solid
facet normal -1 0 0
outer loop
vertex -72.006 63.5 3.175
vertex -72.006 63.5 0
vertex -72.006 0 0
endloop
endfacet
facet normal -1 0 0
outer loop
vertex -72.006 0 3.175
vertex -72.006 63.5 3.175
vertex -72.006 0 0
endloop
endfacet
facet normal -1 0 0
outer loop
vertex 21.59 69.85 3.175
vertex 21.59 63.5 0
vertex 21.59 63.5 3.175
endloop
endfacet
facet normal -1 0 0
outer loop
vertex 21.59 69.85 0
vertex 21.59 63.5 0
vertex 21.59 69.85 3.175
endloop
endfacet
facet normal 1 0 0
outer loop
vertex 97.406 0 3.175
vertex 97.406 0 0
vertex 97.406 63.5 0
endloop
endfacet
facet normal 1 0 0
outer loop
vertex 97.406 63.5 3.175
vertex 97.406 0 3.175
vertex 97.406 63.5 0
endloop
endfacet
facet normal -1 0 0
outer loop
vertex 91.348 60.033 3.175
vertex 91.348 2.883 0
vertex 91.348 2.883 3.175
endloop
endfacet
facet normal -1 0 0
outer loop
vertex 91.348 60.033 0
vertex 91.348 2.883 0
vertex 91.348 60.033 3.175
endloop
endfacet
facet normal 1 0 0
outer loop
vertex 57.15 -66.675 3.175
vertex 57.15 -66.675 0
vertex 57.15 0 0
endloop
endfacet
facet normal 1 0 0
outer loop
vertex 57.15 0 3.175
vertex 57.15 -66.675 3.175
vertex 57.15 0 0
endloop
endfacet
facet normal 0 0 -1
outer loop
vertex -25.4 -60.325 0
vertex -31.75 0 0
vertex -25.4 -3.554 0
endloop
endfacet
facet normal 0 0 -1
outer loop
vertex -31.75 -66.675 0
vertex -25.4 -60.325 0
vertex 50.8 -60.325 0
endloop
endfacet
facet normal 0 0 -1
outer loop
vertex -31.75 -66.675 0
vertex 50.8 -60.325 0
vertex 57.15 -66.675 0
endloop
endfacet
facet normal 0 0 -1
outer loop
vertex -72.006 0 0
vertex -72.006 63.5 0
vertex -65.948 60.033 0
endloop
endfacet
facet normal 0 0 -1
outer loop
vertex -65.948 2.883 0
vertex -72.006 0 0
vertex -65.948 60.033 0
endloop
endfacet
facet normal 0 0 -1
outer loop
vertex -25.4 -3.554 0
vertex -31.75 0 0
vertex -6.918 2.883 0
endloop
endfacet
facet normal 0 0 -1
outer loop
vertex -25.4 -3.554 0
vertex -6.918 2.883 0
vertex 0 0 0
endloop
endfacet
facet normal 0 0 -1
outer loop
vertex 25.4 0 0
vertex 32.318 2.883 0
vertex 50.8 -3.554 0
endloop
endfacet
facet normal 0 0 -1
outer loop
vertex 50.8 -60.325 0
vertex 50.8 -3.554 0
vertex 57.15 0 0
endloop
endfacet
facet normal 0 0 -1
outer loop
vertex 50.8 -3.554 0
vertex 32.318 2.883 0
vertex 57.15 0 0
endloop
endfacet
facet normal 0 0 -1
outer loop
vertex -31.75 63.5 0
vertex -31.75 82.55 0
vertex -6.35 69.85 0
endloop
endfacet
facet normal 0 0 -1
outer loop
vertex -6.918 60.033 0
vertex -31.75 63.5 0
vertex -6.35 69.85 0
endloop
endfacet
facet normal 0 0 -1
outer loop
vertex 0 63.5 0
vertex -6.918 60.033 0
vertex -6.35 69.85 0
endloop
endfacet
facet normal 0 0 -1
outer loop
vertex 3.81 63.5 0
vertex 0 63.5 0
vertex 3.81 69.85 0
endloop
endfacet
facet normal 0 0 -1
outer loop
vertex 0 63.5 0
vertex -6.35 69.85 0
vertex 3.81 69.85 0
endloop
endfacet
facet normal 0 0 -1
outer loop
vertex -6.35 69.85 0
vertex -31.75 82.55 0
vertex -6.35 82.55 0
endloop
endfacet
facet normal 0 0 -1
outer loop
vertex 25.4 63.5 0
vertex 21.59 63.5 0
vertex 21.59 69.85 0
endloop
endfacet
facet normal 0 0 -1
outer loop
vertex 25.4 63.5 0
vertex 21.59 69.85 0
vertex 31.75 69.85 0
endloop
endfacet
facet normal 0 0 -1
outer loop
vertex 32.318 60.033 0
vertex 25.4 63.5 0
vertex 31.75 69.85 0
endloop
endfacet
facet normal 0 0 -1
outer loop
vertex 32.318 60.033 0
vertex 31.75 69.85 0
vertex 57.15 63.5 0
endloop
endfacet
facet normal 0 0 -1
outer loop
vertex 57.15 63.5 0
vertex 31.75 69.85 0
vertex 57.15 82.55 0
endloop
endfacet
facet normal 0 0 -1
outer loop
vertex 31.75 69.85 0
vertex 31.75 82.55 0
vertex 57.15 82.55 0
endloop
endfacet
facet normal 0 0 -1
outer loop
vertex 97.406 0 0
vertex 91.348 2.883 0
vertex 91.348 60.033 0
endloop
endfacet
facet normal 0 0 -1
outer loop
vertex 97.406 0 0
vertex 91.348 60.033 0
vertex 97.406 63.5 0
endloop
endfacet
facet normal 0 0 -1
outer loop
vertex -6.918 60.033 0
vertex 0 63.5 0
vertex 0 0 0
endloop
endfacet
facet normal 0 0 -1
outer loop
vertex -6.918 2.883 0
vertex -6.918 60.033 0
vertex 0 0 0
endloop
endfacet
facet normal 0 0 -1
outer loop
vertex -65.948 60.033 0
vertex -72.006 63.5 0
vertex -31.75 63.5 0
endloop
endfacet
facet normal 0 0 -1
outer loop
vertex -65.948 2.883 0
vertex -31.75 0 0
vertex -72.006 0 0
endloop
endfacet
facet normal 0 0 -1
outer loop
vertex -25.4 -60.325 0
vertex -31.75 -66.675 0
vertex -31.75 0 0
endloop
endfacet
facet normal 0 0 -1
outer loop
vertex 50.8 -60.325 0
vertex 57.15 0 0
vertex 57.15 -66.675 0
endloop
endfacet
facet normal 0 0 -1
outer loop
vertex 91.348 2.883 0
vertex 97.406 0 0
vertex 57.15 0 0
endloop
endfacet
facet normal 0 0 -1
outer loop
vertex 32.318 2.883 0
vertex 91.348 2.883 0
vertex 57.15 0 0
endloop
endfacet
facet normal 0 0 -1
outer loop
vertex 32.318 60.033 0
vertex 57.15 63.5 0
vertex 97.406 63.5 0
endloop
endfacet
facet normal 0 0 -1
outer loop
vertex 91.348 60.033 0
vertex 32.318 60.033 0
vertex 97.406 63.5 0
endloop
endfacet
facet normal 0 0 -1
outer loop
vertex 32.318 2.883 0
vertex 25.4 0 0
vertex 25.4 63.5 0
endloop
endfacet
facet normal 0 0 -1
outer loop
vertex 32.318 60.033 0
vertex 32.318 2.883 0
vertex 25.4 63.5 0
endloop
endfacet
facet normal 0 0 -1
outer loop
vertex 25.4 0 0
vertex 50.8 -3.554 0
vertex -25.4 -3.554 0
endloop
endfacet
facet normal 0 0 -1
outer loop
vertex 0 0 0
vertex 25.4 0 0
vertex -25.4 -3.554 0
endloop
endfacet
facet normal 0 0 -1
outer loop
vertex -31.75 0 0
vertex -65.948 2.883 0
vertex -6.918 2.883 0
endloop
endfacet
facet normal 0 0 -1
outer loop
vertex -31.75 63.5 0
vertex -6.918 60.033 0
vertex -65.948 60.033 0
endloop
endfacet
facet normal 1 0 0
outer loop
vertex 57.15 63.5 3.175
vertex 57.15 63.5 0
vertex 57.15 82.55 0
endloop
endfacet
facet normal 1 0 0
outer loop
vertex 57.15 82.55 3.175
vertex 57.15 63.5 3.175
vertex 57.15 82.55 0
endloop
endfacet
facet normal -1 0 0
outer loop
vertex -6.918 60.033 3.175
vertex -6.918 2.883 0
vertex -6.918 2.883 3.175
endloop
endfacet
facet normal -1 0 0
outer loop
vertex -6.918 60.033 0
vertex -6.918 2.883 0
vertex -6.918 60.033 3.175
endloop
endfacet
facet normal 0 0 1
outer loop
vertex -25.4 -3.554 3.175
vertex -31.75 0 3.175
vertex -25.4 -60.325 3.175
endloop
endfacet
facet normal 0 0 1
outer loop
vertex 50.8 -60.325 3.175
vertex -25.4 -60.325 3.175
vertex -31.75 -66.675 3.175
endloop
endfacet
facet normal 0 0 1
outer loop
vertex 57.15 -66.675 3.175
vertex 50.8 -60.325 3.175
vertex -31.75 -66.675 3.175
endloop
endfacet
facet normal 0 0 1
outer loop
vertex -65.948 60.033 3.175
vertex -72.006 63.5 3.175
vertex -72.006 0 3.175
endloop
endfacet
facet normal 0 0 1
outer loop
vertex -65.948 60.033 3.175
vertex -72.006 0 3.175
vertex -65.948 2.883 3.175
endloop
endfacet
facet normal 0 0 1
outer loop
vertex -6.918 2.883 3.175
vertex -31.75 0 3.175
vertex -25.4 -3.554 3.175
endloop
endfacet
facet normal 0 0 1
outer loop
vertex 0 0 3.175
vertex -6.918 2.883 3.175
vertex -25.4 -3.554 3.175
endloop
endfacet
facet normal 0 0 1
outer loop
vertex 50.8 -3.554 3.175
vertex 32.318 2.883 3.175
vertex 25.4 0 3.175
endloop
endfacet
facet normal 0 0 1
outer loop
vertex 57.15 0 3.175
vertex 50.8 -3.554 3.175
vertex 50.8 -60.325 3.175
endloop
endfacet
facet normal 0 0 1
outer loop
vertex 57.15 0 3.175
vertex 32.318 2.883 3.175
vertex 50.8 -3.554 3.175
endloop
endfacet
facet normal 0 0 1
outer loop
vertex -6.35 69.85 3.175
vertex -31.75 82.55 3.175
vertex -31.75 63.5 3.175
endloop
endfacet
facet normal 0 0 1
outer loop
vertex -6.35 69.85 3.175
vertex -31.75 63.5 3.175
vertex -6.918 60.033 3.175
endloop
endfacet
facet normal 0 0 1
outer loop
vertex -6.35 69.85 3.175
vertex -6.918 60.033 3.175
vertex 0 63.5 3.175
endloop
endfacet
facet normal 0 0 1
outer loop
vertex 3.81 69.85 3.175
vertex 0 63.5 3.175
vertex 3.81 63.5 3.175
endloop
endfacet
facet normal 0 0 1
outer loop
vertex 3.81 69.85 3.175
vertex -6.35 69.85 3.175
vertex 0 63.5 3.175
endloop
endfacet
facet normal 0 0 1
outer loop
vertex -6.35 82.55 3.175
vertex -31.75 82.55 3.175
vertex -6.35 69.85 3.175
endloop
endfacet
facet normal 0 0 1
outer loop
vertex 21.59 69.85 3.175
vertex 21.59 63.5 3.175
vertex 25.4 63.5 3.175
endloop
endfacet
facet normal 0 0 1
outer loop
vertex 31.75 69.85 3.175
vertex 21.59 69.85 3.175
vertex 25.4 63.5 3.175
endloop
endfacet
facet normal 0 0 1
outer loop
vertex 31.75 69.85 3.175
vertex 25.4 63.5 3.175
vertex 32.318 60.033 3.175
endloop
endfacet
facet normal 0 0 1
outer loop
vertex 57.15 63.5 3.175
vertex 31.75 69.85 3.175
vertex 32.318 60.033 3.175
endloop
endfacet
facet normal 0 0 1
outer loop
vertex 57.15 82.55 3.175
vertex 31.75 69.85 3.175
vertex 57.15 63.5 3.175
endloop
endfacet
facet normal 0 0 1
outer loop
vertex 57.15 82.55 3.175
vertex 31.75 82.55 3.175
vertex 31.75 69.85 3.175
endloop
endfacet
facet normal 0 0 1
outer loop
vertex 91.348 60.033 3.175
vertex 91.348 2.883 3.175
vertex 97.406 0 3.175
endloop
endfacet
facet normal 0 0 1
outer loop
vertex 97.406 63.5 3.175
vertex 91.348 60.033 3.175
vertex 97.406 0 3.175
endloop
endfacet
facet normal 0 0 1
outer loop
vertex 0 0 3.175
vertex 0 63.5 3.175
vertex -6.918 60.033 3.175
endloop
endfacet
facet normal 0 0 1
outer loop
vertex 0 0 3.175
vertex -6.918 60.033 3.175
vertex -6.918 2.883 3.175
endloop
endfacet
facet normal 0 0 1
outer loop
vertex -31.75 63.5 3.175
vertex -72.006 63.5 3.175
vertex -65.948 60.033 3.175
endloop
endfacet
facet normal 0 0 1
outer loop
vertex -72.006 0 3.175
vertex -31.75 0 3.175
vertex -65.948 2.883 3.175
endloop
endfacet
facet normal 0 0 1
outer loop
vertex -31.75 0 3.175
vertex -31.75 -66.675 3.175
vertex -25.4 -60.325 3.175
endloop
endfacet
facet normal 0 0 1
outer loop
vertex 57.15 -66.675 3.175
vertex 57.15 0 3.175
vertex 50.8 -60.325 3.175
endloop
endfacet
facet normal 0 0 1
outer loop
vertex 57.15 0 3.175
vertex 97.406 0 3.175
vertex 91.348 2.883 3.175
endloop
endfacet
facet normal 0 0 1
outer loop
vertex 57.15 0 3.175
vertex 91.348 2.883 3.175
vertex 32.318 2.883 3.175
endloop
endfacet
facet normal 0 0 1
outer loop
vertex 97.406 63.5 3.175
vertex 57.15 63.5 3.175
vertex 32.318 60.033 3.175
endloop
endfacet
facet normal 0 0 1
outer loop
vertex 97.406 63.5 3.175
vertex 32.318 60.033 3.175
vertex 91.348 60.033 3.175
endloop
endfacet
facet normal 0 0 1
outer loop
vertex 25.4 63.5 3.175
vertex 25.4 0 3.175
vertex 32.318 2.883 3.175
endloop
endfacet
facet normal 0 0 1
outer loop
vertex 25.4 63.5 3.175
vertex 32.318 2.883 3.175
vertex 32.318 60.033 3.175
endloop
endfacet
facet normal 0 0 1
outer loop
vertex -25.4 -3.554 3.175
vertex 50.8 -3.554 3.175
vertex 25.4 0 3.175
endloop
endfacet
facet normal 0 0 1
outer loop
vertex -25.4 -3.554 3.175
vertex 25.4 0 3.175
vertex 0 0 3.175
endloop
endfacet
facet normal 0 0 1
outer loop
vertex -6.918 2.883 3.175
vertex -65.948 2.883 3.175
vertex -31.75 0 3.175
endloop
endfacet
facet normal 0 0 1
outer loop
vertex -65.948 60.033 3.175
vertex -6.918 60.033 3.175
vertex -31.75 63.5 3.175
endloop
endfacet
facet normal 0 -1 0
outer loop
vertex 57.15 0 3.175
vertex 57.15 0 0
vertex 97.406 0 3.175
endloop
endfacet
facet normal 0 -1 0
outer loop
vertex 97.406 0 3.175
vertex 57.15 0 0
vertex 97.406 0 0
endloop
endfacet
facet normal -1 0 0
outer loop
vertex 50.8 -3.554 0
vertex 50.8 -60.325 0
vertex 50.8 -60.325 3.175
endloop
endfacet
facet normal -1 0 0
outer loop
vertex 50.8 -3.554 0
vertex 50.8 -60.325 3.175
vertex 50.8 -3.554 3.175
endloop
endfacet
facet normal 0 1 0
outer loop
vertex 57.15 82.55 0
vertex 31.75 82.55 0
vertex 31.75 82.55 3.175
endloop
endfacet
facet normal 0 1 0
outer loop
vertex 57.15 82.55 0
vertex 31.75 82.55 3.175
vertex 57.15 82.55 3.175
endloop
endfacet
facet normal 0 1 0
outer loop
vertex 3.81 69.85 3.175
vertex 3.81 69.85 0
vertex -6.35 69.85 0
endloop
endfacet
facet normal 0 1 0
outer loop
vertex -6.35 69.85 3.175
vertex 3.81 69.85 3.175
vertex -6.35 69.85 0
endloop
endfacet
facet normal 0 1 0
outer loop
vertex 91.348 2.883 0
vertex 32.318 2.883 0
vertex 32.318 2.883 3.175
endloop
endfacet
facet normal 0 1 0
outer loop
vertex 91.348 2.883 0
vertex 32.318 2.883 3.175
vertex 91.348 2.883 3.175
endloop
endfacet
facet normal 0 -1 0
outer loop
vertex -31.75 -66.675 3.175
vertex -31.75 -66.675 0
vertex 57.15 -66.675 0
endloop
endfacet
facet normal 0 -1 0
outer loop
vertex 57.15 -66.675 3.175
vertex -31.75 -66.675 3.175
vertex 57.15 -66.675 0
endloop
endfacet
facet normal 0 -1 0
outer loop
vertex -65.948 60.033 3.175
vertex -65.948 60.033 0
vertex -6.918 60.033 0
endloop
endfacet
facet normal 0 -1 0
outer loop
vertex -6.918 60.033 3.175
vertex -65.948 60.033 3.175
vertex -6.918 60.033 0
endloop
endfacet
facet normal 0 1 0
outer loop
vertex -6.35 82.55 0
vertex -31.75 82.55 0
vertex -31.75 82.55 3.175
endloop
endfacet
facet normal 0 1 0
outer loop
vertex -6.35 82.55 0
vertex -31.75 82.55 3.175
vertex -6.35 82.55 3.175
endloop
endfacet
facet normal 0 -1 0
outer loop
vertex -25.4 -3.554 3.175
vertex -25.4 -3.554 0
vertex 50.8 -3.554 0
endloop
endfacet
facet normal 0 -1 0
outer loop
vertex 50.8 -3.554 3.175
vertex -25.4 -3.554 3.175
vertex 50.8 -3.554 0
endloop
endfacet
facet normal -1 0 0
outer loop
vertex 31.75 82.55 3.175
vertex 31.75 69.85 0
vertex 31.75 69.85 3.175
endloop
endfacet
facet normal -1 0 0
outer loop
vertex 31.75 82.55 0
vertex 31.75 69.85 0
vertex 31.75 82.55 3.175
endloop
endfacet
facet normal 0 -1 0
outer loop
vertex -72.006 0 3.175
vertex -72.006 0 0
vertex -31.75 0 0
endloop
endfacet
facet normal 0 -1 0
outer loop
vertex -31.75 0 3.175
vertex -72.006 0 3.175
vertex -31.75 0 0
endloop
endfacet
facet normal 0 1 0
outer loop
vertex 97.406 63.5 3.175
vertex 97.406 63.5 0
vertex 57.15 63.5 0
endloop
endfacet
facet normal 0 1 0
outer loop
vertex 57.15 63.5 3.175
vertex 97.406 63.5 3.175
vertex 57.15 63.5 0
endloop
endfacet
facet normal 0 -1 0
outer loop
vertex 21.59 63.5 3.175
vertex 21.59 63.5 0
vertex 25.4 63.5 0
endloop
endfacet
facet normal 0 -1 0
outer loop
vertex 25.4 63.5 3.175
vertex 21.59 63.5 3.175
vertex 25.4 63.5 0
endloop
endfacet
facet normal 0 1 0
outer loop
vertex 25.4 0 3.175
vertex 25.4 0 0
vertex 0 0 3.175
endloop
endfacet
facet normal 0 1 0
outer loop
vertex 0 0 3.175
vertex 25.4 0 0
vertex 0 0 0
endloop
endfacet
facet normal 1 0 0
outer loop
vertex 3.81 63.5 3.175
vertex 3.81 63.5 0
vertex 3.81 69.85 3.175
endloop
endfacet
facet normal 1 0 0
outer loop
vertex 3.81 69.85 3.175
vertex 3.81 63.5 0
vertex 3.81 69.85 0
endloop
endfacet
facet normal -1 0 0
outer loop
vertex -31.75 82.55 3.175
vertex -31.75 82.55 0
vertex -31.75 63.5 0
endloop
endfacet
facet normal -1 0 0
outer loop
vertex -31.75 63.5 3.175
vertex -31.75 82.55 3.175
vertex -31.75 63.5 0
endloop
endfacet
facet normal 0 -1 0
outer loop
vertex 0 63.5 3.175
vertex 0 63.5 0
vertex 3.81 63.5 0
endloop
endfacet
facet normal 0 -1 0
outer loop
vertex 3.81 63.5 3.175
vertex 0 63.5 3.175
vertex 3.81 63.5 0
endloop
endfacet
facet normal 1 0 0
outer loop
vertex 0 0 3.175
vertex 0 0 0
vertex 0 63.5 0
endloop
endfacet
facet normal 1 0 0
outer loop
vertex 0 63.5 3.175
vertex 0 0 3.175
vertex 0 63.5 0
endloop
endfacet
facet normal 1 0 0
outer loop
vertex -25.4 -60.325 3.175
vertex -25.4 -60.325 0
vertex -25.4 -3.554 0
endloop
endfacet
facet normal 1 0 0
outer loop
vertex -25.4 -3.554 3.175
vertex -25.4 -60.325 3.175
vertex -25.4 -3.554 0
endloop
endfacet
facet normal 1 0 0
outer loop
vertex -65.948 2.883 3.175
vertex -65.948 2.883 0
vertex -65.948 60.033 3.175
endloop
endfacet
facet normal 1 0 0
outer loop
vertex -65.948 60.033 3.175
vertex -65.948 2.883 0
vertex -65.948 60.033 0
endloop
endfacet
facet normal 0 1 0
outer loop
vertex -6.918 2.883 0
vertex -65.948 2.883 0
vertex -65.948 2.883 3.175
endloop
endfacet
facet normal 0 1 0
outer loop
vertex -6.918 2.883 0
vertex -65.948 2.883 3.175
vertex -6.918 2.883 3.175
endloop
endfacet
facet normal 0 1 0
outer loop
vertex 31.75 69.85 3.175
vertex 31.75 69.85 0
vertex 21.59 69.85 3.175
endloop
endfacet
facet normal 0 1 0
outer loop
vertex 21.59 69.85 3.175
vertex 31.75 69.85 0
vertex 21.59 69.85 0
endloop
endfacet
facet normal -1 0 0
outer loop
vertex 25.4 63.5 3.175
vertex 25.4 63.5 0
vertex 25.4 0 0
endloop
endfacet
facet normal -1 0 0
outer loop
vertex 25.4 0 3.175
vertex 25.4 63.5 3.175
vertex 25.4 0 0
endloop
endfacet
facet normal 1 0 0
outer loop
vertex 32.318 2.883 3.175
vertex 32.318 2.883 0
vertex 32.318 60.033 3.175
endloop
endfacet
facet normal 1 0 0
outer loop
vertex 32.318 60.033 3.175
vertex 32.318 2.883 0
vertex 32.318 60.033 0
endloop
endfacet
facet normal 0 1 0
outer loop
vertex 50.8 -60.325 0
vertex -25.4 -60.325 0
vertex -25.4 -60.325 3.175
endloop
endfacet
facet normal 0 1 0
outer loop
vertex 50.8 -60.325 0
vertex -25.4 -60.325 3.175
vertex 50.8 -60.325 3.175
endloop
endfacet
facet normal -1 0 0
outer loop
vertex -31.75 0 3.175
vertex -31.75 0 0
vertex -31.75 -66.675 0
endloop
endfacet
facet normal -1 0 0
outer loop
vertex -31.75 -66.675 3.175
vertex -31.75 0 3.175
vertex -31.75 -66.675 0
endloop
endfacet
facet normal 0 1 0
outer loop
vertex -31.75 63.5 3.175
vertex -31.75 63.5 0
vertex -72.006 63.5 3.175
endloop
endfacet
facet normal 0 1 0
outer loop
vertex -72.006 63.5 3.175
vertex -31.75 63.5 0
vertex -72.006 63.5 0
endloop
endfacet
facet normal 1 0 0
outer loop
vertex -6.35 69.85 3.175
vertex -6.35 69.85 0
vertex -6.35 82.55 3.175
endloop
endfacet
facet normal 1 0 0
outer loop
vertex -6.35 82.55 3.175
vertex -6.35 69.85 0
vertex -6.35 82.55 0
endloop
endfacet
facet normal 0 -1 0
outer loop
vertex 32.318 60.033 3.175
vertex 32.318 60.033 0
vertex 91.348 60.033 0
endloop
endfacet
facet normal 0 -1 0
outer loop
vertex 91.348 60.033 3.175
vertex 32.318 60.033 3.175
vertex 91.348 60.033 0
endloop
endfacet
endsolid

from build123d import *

# Parameters (mm, degrees)
F0_W     = 2.155658
F0_H     = 63.5
F0_W_2   = 76.2
F0_H_2   = 56.771246
F0_W_3   = 59.0296
F0_H_3   = 57.15
F0_W_4   = 3.81
F0_H_4   = 6.35
F0_W_5   = 25.4
F0_H_5   = 12.7
F1_DEPTH = 3.175


with BuildPart() as f1:
    # F0 (on Top) → F1 (new body)
    with BuildSketch(Plane.XY):
        with Locations((-1.077829, 31.75)):
            Rectangle(F0_W, F0_H)
        Polygon((0, 0), (-2.155658, 0), (-2.155658, 63.5), (-31.75, 63.5), (-72.005658, 63.5), (-72.005658, 0), (-31.75, 0), (-31.75, -66.675), (57.15, -66.675), (57.15, 0), (97.405658, 0), (97.405658, 63.5), (57.15, 63.5), (27.555658, 63.5), (27.555658, 0), (25.4, 0), (12.7, 0), align=None)
        with Locations((12.7, -31.939377)):
            Rectangle(F0_W_2, F0_H_2, mode=Mode.SUBTRACT)
        with Locations((-36.432958, 31.4579)):
            Rectangle(F0_W_3, F0_H_3, mode=Mode.SUBTRACT)
        with Locations((61.832958, 31.4579)):
            Rectangle(F0_W_3, F0_H_3, mode=Mode.SUBTRACT)
        Polygon((-31.75, 63.5), (-2.155658, 63.5), (0, 63.5), (0, 69.85), (-6.35, 69.85), (-31.75, 69.85), align=None)
        with Locations((1.905, 66.675)):
            Rectangle(F0_W_4, F0_H_4)
        with Locations((26.477829, 31.75)):
            Rectangle(F0_W, F0_H)
        with Locations((-19.05, 76.2)):
            Rectangle(F0_W_5, F0_H_5)
        Polygon((25.4, 69.85), (25.4, 63.5), (27.555658, 63.5), (57.15, 63.5), (57.15, 69.85), (31.75, 69.85), align=None)
        with Locations((23.495, 66.675)):
            Rectangle(F0_W_4, F0_H_4)
        with Locations((44.45, 76.2)):
            Rectangle(F0_W_5, F0_H_5)
    extrude(amount=F1_DEPTH)


solid = f1.part
